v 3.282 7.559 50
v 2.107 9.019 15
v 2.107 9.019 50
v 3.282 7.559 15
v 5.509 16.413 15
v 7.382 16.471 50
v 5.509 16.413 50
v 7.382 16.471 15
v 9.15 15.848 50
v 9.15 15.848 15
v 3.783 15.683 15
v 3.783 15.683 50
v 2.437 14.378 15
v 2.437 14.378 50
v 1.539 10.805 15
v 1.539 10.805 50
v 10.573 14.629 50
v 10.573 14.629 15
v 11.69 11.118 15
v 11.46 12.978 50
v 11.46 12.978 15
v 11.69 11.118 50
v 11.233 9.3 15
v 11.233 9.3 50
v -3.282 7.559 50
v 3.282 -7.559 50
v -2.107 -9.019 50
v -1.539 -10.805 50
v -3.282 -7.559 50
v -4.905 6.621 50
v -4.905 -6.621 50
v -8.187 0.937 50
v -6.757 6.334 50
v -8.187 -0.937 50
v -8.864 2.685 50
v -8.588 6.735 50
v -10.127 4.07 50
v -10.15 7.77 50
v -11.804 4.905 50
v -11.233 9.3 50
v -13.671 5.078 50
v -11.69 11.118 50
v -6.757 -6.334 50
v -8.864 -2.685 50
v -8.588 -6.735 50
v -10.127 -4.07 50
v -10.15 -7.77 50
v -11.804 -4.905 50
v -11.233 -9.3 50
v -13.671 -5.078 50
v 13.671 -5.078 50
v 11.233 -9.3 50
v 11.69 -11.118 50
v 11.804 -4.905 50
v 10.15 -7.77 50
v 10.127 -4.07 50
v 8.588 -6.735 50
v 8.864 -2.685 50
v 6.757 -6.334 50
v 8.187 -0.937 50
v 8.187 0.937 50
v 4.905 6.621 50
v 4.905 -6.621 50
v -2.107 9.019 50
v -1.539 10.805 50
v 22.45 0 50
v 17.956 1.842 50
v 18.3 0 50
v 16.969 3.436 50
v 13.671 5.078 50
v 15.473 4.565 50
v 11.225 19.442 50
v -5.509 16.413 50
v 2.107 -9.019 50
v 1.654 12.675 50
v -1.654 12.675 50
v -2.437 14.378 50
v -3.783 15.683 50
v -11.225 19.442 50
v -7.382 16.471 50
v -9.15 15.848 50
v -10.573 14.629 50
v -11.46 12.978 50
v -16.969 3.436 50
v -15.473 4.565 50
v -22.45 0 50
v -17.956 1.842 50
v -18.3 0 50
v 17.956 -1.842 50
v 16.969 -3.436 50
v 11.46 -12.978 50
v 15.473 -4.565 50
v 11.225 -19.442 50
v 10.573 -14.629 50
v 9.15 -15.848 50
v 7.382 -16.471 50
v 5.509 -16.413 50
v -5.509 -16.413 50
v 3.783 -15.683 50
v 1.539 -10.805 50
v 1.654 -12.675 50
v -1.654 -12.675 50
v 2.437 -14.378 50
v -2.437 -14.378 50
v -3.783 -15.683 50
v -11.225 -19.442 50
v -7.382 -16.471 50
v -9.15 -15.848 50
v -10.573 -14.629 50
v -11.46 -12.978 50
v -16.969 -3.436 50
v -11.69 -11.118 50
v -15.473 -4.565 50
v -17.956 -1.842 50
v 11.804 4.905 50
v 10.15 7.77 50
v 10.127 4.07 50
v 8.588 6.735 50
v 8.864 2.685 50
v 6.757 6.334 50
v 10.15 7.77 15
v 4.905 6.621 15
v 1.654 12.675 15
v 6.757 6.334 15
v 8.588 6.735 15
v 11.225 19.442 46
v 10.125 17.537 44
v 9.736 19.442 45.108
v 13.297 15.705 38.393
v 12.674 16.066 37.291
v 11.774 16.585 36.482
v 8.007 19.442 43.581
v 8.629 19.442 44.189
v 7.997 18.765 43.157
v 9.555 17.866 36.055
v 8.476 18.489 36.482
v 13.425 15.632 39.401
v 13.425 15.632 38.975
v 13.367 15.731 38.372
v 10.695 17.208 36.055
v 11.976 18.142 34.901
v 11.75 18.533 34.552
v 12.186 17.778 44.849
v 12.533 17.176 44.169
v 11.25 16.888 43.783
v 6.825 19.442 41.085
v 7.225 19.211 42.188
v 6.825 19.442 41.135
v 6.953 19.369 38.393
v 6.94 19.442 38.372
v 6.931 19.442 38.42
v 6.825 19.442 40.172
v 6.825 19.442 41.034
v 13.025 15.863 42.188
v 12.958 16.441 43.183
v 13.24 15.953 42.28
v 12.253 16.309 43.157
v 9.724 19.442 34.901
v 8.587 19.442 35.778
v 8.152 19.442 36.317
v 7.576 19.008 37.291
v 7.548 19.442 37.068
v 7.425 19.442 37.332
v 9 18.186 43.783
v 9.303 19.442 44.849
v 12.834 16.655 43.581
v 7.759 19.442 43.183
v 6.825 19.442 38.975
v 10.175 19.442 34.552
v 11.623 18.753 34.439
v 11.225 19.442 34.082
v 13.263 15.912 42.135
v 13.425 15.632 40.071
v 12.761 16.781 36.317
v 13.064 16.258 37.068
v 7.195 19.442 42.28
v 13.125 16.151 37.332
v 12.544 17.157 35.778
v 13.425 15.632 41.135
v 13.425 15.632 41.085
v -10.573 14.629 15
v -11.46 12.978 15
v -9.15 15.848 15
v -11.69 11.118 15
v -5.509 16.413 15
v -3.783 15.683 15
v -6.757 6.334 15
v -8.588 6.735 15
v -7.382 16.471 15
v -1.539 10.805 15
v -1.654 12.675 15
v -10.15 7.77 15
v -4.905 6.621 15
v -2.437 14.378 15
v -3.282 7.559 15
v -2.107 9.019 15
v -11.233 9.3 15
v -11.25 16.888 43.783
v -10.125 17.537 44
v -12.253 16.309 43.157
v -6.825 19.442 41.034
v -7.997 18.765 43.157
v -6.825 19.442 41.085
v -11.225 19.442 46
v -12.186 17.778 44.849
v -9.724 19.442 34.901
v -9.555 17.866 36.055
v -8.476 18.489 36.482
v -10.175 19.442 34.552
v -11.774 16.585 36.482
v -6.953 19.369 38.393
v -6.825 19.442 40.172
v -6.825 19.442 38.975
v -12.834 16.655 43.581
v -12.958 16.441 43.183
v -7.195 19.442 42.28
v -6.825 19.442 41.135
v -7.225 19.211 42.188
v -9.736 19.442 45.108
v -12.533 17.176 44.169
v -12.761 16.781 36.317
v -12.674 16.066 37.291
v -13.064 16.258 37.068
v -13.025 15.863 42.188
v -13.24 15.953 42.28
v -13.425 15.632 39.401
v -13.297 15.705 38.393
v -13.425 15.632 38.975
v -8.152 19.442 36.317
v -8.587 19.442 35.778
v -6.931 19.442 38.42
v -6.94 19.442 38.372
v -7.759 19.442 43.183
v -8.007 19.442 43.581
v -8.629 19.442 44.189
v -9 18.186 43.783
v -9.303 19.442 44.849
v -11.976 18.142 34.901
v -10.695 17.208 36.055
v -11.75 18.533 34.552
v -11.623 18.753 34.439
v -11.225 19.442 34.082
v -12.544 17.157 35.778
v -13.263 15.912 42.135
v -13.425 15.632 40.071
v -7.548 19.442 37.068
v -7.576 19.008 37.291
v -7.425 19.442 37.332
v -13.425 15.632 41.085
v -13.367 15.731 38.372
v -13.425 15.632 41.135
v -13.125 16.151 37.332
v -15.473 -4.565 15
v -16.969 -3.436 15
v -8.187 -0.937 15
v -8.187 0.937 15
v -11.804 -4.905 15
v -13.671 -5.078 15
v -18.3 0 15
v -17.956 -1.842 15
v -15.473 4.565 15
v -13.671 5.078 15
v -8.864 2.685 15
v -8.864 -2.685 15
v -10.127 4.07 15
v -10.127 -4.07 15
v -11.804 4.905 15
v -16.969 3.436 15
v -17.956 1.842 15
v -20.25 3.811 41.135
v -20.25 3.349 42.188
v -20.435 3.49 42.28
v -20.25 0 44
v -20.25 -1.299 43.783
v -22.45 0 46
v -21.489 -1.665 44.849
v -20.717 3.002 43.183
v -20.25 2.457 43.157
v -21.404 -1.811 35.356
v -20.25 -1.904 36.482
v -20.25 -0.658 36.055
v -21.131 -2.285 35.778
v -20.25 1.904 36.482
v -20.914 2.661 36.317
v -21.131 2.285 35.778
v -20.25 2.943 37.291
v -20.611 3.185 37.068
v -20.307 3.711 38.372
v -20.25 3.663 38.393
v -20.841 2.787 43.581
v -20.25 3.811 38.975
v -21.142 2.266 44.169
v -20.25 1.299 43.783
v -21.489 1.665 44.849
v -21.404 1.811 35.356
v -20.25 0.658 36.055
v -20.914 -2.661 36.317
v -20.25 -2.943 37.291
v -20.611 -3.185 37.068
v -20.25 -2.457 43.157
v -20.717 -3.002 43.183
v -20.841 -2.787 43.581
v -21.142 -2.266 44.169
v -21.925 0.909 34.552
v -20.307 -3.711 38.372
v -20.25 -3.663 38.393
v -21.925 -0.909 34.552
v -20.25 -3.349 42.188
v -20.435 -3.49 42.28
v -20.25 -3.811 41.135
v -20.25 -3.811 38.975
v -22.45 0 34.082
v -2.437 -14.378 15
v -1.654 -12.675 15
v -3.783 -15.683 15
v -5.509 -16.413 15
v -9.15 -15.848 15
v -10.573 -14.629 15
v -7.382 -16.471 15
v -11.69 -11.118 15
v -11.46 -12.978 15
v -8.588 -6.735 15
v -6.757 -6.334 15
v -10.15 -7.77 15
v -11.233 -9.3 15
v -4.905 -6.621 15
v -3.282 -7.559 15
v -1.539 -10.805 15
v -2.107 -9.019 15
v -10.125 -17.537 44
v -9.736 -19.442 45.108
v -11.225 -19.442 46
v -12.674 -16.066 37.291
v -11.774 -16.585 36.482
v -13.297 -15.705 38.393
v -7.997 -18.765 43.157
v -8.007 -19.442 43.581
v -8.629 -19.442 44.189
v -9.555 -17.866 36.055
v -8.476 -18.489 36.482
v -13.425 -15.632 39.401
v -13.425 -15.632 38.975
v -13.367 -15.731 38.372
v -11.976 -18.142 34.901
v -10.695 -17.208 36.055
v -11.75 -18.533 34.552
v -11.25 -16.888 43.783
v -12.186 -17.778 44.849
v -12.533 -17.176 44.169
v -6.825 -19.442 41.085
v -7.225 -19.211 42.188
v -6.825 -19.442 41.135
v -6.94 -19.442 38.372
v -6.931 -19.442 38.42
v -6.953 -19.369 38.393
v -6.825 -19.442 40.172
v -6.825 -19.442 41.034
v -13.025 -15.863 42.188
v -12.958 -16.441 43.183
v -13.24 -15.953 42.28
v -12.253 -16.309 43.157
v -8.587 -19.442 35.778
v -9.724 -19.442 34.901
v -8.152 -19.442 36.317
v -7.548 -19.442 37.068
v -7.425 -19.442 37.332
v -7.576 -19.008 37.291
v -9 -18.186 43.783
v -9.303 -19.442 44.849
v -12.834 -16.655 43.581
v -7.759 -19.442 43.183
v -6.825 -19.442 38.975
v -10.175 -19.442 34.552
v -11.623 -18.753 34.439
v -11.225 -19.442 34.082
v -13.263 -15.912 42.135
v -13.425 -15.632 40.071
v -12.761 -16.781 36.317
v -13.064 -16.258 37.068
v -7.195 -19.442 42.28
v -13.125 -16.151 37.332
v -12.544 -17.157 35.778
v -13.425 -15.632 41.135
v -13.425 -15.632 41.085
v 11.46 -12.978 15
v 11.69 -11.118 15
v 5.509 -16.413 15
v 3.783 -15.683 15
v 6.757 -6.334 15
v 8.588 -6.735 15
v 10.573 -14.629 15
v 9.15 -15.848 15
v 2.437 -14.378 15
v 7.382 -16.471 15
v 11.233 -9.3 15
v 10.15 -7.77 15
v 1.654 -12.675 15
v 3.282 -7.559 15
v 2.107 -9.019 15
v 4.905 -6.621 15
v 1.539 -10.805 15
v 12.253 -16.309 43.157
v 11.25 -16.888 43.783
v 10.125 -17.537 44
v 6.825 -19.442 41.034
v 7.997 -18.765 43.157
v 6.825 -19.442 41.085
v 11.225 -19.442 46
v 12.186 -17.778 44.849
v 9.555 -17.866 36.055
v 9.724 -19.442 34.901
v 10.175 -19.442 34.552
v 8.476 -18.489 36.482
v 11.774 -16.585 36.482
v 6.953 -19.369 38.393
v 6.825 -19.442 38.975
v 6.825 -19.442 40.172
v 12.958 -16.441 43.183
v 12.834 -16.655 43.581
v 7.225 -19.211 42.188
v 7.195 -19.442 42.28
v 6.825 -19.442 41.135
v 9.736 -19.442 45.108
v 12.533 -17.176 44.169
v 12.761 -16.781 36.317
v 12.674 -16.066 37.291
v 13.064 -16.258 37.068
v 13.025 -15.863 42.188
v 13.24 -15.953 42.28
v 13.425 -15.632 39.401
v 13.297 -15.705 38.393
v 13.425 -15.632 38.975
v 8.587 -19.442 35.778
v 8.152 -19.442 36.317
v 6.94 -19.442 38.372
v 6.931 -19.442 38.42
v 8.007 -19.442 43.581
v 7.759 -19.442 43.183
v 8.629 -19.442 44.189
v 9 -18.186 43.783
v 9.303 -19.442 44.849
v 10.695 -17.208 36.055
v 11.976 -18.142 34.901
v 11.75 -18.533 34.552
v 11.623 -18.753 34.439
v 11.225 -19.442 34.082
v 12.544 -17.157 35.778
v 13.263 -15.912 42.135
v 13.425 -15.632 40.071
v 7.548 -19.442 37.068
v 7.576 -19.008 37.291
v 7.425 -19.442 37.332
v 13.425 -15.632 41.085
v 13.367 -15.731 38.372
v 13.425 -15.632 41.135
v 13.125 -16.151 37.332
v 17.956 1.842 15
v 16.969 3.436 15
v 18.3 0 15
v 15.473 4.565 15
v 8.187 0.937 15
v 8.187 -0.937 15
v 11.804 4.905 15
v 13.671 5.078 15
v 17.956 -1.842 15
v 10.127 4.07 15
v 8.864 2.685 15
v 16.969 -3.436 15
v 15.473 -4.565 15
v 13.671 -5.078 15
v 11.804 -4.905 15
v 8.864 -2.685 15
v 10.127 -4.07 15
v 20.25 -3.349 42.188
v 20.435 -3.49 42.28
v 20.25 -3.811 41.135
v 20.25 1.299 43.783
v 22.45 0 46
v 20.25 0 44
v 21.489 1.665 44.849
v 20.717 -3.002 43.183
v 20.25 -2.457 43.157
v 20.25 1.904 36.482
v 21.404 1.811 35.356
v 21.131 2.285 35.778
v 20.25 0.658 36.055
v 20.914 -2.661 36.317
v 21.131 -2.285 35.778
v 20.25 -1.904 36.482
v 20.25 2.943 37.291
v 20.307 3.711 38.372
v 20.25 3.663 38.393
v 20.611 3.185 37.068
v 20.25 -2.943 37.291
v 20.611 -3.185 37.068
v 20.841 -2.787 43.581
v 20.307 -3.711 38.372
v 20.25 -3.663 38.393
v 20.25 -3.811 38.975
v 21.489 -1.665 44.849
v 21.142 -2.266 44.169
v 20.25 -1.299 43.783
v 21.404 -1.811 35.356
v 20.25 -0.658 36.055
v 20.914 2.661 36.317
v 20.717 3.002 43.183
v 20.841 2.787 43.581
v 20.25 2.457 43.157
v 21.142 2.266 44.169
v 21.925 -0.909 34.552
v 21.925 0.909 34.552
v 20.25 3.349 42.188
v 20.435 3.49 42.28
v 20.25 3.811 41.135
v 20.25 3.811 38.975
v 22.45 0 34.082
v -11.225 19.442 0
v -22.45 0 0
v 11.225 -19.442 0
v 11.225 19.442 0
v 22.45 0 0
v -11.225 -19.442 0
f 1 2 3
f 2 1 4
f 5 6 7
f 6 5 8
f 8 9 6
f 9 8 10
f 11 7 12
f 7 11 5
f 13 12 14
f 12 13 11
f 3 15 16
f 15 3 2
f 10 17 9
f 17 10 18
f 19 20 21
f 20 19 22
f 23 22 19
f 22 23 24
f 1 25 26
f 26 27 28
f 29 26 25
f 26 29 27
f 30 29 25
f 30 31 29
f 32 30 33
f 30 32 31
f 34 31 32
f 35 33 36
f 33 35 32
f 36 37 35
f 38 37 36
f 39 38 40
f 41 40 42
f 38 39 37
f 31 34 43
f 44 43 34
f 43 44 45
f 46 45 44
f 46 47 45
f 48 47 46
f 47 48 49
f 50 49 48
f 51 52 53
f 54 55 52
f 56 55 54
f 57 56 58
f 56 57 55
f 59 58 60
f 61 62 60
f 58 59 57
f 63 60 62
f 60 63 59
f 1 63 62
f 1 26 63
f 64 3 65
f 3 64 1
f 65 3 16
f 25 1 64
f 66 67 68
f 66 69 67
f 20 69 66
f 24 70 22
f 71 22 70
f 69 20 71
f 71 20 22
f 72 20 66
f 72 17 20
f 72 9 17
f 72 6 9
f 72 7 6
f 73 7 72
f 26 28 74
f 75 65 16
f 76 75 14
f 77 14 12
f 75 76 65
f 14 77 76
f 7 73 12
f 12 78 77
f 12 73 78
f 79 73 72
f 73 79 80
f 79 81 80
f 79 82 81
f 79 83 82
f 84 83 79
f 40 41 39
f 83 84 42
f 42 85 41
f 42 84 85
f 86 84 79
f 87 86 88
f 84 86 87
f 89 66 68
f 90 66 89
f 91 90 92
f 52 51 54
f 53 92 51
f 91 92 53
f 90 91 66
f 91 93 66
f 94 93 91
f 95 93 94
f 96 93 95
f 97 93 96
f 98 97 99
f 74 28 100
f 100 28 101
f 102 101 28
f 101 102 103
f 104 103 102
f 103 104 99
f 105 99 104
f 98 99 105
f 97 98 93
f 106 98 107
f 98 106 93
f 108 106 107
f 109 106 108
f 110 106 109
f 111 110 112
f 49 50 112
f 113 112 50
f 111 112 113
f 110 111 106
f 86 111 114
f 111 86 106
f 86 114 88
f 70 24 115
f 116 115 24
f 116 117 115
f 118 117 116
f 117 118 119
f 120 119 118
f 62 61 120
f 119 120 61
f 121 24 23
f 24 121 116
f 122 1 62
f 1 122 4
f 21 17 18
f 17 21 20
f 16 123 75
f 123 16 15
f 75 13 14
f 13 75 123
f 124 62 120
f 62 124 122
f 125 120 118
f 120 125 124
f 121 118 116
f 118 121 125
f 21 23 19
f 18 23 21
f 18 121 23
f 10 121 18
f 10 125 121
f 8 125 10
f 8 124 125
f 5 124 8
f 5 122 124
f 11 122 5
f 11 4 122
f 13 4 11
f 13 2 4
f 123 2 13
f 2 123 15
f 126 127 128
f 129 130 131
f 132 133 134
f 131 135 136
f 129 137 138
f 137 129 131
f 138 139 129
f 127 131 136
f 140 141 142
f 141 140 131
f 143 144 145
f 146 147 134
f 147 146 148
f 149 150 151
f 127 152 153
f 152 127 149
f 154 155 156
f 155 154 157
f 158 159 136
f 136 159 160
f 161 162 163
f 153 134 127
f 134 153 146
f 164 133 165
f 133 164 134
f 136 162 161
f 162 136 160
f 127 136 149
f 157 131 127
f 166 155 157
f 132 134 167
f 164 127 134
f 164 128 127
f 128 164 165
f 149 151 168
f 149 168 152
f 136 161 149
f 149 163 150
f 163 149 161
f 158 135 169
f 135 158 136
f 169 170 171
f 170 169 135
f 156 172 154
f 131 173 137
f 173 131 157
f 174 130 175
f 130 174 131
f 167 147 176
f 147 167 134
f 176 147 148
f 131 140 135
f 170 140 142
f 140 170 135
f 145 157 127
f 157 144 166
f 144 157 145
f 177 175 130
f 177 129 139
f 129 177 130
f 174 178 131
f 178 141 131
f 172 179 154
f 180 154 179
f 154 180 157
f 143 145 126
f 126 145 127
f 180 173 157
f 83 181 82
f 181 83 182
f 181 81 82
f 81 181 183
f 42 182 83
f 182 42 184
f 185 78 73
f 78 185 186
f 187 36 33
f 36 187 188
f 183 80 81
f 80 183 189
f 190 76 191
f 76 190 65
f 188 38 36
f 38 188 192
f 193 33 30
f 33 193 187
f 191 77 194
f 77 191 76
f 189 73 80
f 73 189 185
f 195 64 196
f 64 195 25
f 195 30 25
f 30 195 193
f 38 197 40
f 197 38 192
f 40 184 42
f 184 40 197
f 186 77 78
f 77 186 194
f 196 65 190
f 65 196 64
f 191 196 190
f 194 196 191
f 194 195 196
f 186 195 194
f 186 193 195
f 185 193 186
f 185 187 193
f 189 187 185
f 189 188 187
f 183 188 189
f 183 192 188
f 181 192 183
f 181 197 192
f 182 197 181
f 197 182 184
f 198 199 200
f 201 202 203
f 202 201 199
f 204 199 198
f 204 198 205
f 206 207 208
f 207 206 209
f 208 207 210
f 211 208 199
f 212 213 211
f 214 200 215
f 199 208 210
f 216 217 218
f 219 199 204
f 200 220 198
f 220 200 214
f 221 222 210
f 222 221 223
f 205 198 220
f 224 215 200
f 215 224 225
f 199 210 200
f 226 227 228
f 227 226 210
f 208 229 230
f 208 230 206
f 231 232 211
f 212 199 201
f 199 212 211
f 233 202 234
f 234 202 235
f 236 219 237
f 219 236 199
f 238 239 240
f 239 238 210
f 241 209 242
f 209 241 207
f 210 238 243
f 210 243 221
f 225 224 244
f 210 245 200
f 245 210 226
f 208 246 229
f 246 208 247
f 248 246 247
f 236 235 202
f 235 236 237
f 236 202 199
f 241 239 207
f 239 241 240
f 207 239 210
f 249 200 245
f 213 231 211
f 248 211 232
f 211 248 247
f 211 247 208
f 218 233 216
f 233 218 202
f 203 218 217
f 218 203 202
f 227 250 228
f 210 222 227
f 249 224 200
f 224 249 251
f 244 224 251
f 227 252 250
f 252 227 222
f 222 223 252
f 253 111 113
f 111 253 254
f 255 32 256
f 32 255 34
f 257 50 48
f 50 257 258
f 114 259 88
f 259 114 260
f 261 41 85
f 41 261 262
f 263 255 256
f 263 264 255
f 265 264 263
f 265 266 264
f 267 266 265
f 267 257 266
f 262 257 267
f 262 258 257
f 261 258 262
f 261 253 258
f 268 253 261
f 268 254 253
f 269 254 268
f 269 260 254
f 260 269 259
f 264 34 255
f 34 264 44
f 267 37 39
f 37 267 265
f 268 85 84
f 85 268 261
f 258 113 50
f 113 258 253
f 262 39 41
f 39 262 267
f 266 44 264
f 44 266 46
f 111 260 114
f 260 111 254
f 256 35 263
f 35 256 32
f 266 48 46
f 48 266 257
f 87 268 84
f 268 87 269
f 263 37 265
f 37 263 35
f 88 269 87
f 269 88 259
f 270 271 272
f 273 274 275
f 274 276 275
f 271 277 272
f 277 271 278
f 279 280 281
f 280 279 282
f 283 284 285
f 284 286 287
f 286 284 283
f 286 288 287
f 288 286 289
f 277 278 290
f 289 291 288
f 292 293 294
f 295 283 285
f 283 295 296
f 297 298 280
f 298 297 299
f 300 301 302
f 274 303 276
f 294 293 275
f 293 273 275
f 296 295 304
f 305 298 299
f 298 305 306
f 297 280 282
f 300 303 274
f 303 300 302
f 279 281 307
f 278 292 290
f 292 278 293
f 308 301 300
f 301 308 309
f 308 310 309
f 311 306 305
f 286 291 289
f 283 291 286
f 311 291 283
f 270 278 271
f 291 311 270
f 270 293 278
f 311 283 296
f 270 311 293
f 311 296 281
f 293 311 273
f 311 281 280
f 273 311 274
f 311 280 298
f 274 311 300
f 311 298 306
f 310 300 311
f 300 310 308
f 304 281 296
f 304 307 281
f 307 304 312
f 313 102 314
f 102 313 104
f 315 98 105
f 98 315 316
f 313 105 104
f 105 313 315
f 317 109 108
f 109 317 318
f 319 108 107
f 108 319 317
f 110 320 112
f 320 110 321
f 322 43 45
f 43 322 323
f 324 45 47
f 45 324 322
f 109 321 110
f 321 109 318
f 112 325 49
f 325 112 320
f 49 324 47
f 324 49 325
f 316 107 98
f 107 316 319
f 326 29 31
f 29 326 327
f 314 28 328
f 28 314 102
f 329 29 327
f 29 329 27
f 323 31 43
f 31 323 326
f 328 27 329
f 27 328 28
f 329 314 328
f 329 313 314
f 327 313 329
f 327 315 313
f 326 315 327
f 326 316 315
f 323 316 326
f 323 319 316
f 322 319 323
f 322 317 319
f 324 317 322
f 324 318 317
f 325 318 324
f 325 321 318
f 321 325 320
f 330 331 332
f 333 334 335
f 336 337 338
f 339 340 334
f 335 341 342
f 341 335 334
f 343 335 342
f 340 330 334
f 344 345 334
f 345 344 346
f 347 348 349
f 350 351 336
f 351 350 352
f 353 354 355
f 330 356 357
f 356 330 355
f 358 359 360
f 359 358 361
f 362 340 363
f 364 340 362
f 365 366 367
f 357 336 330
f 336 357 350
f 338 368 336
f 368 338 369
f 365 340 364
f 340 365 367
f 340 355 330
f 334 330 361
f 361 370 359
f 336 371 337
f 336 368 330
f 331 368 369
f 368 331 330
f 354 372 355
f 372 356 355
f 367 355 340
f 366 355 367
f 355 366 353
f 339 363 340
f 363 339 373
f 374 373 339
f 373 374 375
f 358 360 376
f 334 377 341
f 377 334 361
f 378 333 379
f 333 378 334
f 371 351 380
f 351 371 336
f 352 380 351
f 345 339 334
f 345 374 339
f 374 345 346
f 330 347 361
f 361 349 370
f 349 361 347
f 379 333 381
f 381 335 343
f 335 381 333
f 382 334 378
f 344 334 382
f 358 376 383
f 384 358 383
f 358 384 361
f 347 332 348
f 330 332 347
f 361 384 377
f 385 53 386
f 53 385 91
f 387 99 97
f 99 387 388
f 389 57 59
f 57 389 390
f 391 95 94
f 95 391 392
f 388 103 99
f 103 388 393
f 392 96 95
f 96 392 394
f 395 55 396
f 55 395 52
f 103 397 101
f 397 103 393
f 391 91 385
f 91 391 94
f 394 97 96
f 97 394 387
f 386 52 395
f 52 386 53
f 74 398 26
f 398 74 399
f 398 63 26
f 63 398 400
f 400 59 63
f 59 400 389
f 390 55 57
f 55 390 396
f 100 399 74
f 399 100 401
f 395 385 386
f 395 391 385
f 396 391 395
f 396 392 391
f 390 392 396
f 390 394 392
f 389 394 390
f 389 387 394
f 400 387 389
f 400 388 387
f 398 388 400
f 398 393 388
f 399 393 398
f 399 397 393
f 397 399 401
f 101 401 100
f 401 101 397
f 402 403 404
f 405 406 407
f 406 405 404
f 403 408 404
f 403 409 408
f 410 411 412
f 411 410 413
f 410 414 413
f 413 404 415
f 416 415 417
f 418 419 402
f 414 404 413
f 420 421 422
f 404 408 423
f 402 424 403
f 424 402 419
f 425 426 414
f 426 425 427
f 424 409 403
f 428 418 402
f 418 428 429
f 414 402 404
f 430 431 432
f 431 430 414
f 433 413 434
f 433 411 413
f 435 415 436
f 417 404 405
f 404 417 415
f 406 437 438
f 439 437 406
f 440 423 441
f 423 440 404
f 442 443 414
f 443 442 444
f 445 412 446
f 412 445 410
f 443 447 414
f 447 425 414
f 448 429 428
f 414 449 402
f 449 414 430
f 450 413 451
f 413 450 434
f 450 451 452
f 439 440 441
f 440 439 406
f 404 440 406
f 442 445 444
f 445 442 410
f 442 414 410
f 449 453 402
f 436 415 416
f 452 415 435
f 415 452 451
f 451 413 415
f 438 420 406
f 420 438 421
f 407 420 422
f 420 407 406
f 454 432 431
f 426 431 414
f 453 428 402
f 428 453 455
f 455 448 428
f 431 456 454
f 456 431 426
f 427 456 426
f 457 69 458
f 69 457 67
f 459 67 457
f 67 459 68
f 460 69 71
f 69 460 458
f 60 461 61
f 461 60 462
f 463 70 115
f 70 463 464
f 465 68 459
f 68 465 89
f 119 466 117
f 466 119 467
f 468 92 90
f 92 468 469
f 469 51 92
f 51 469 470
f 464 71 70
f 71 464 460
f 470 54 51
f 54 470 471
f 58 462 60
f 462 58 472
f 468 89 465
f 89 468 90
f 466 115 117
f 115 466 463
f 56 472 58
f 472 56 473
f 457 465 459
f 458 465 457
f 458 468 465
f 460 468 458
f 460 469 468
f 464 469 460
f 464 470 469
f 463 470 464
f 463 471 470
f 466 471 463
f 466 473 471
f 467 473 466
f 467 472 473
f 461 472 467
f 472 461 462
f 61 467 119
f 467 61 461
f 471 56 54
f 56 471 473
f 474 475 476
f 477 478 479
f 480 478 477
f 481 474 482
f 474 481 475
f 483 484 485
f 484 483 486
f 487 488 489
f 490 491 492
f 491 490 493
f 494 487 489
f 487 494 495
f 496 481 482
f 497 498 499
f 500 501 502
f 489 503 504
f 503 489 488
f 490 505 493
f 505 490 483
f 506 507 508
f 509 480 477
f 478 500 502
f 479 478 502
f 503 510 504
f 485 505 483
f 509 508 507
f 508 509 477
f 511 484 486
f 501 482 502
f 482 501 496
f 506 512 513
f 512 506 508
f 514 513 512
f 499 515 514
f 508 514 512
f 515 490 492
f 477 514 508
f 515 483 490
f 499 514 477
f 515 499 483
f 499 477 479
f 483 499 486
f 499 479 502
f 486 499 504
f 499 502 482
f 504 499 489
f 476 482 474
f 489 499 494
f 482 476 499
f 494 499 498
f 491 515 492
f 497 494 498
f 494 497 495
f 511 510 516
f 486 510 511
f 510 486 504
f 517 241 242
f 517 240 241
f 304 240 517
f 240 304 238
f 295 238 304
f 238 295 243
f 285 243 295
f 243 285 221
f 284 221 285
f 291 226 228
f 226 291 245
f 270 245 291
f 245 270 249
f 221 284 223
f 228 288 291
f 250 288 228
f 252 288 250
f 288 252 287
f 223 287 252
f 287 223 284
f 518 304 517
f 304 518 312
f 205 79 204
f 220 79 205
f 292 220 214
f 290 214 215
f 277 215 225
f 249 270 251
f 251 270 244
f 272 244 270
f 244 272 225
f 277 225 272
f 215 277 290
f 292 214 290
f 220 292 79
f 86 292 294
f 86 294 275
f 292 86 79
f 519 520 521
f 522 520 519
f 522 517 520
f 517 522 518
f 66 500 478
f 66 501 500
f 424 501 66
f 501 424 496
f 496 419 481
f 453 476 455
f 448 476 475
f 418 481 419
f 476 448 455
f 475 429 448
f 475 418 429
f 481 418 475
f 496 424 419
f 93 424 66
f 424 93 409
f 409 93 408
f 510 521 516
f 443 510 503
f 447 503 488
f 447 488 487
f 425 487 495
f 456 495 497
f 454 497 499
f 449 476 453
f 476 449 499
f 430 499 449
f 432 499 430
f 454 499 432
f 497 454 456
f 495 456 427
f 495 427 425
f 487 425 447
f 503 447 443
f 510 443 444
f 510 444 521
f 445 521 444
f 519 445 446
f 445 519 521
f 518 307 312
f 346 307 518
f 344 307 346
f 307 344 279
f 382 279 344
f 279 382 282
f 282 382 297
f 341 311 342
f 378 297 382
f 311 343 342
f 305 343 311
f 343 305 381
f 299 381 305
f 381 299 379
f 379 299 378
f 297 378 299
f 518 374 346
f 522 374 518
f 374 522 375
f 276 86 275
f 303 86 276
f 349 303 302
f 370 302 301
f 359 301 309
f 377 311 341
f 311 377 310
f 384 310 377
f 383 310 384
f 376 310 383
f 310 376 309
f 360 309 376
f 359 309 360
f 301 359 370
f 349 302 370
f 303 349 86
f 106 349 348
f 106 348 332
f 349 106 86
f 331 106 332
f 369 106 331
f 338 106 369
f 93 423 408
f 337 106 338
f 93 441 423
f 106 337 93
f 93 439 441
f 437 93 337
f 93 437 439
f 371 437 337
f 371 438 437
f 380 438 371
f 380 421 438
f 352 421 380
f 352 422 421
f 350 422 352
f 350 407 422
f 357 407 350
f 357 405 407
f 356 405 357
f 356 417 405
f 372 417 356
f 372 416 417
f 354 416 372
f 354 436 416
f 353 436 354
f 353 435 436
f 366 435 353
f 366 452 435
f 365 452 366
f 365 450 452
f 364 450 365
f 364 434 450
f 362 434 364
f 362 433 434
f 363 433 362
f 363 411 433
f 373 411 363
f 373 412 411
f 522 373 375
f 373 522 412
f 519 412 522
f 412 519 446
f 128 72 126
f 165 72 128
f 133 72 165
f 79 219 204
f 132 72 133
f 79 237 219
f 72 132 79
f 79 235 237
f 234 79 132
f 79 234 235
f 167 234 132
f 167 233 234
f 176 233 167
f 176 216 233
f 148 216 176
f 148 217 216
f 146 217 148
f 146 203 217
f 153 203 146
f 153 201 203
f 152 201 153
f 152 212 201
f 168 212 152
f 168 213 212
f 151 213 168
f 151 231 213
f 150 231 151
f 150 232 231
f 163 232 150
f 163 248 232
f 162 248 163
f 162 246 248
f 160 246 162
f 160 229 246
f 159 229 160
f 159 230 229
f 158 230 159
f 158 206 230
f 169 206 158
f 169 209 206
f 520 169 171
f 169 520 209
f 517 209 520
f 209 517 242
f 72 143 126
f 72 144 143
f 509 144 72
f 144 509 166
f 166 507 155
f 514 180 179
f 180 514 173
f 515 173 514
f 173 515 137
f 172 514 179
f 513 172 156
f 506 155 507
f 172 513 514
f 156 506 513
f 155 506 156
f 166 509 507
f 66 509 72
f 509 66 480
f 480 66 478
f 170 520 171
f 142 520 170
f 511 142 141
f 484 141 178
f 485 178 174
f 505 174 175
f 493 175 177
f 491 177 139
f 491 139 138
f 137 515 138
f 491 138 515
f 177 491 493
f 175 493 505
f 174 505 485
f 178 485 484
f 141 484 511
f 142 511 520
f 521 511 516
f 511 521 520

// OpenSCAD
anzahl = 6;


difference(){
    linear_extrude(50)circle($fn=anzahl, r=sqrt(84*anzahl));
    
    for(a=[1:anzahl]) {
       rotate([0,0,360/anzahl*(a)])
       translate([2.2*anzahl,0,15])cylinder(r=5.1, h=35);
       rotate([0,0,360/anzahl*(a)])translate([sqrt(84*anzahl),0,40])       rotate([0,-90,0])cylinder(r1=6,r2=4,h=2.2);
    }
}
